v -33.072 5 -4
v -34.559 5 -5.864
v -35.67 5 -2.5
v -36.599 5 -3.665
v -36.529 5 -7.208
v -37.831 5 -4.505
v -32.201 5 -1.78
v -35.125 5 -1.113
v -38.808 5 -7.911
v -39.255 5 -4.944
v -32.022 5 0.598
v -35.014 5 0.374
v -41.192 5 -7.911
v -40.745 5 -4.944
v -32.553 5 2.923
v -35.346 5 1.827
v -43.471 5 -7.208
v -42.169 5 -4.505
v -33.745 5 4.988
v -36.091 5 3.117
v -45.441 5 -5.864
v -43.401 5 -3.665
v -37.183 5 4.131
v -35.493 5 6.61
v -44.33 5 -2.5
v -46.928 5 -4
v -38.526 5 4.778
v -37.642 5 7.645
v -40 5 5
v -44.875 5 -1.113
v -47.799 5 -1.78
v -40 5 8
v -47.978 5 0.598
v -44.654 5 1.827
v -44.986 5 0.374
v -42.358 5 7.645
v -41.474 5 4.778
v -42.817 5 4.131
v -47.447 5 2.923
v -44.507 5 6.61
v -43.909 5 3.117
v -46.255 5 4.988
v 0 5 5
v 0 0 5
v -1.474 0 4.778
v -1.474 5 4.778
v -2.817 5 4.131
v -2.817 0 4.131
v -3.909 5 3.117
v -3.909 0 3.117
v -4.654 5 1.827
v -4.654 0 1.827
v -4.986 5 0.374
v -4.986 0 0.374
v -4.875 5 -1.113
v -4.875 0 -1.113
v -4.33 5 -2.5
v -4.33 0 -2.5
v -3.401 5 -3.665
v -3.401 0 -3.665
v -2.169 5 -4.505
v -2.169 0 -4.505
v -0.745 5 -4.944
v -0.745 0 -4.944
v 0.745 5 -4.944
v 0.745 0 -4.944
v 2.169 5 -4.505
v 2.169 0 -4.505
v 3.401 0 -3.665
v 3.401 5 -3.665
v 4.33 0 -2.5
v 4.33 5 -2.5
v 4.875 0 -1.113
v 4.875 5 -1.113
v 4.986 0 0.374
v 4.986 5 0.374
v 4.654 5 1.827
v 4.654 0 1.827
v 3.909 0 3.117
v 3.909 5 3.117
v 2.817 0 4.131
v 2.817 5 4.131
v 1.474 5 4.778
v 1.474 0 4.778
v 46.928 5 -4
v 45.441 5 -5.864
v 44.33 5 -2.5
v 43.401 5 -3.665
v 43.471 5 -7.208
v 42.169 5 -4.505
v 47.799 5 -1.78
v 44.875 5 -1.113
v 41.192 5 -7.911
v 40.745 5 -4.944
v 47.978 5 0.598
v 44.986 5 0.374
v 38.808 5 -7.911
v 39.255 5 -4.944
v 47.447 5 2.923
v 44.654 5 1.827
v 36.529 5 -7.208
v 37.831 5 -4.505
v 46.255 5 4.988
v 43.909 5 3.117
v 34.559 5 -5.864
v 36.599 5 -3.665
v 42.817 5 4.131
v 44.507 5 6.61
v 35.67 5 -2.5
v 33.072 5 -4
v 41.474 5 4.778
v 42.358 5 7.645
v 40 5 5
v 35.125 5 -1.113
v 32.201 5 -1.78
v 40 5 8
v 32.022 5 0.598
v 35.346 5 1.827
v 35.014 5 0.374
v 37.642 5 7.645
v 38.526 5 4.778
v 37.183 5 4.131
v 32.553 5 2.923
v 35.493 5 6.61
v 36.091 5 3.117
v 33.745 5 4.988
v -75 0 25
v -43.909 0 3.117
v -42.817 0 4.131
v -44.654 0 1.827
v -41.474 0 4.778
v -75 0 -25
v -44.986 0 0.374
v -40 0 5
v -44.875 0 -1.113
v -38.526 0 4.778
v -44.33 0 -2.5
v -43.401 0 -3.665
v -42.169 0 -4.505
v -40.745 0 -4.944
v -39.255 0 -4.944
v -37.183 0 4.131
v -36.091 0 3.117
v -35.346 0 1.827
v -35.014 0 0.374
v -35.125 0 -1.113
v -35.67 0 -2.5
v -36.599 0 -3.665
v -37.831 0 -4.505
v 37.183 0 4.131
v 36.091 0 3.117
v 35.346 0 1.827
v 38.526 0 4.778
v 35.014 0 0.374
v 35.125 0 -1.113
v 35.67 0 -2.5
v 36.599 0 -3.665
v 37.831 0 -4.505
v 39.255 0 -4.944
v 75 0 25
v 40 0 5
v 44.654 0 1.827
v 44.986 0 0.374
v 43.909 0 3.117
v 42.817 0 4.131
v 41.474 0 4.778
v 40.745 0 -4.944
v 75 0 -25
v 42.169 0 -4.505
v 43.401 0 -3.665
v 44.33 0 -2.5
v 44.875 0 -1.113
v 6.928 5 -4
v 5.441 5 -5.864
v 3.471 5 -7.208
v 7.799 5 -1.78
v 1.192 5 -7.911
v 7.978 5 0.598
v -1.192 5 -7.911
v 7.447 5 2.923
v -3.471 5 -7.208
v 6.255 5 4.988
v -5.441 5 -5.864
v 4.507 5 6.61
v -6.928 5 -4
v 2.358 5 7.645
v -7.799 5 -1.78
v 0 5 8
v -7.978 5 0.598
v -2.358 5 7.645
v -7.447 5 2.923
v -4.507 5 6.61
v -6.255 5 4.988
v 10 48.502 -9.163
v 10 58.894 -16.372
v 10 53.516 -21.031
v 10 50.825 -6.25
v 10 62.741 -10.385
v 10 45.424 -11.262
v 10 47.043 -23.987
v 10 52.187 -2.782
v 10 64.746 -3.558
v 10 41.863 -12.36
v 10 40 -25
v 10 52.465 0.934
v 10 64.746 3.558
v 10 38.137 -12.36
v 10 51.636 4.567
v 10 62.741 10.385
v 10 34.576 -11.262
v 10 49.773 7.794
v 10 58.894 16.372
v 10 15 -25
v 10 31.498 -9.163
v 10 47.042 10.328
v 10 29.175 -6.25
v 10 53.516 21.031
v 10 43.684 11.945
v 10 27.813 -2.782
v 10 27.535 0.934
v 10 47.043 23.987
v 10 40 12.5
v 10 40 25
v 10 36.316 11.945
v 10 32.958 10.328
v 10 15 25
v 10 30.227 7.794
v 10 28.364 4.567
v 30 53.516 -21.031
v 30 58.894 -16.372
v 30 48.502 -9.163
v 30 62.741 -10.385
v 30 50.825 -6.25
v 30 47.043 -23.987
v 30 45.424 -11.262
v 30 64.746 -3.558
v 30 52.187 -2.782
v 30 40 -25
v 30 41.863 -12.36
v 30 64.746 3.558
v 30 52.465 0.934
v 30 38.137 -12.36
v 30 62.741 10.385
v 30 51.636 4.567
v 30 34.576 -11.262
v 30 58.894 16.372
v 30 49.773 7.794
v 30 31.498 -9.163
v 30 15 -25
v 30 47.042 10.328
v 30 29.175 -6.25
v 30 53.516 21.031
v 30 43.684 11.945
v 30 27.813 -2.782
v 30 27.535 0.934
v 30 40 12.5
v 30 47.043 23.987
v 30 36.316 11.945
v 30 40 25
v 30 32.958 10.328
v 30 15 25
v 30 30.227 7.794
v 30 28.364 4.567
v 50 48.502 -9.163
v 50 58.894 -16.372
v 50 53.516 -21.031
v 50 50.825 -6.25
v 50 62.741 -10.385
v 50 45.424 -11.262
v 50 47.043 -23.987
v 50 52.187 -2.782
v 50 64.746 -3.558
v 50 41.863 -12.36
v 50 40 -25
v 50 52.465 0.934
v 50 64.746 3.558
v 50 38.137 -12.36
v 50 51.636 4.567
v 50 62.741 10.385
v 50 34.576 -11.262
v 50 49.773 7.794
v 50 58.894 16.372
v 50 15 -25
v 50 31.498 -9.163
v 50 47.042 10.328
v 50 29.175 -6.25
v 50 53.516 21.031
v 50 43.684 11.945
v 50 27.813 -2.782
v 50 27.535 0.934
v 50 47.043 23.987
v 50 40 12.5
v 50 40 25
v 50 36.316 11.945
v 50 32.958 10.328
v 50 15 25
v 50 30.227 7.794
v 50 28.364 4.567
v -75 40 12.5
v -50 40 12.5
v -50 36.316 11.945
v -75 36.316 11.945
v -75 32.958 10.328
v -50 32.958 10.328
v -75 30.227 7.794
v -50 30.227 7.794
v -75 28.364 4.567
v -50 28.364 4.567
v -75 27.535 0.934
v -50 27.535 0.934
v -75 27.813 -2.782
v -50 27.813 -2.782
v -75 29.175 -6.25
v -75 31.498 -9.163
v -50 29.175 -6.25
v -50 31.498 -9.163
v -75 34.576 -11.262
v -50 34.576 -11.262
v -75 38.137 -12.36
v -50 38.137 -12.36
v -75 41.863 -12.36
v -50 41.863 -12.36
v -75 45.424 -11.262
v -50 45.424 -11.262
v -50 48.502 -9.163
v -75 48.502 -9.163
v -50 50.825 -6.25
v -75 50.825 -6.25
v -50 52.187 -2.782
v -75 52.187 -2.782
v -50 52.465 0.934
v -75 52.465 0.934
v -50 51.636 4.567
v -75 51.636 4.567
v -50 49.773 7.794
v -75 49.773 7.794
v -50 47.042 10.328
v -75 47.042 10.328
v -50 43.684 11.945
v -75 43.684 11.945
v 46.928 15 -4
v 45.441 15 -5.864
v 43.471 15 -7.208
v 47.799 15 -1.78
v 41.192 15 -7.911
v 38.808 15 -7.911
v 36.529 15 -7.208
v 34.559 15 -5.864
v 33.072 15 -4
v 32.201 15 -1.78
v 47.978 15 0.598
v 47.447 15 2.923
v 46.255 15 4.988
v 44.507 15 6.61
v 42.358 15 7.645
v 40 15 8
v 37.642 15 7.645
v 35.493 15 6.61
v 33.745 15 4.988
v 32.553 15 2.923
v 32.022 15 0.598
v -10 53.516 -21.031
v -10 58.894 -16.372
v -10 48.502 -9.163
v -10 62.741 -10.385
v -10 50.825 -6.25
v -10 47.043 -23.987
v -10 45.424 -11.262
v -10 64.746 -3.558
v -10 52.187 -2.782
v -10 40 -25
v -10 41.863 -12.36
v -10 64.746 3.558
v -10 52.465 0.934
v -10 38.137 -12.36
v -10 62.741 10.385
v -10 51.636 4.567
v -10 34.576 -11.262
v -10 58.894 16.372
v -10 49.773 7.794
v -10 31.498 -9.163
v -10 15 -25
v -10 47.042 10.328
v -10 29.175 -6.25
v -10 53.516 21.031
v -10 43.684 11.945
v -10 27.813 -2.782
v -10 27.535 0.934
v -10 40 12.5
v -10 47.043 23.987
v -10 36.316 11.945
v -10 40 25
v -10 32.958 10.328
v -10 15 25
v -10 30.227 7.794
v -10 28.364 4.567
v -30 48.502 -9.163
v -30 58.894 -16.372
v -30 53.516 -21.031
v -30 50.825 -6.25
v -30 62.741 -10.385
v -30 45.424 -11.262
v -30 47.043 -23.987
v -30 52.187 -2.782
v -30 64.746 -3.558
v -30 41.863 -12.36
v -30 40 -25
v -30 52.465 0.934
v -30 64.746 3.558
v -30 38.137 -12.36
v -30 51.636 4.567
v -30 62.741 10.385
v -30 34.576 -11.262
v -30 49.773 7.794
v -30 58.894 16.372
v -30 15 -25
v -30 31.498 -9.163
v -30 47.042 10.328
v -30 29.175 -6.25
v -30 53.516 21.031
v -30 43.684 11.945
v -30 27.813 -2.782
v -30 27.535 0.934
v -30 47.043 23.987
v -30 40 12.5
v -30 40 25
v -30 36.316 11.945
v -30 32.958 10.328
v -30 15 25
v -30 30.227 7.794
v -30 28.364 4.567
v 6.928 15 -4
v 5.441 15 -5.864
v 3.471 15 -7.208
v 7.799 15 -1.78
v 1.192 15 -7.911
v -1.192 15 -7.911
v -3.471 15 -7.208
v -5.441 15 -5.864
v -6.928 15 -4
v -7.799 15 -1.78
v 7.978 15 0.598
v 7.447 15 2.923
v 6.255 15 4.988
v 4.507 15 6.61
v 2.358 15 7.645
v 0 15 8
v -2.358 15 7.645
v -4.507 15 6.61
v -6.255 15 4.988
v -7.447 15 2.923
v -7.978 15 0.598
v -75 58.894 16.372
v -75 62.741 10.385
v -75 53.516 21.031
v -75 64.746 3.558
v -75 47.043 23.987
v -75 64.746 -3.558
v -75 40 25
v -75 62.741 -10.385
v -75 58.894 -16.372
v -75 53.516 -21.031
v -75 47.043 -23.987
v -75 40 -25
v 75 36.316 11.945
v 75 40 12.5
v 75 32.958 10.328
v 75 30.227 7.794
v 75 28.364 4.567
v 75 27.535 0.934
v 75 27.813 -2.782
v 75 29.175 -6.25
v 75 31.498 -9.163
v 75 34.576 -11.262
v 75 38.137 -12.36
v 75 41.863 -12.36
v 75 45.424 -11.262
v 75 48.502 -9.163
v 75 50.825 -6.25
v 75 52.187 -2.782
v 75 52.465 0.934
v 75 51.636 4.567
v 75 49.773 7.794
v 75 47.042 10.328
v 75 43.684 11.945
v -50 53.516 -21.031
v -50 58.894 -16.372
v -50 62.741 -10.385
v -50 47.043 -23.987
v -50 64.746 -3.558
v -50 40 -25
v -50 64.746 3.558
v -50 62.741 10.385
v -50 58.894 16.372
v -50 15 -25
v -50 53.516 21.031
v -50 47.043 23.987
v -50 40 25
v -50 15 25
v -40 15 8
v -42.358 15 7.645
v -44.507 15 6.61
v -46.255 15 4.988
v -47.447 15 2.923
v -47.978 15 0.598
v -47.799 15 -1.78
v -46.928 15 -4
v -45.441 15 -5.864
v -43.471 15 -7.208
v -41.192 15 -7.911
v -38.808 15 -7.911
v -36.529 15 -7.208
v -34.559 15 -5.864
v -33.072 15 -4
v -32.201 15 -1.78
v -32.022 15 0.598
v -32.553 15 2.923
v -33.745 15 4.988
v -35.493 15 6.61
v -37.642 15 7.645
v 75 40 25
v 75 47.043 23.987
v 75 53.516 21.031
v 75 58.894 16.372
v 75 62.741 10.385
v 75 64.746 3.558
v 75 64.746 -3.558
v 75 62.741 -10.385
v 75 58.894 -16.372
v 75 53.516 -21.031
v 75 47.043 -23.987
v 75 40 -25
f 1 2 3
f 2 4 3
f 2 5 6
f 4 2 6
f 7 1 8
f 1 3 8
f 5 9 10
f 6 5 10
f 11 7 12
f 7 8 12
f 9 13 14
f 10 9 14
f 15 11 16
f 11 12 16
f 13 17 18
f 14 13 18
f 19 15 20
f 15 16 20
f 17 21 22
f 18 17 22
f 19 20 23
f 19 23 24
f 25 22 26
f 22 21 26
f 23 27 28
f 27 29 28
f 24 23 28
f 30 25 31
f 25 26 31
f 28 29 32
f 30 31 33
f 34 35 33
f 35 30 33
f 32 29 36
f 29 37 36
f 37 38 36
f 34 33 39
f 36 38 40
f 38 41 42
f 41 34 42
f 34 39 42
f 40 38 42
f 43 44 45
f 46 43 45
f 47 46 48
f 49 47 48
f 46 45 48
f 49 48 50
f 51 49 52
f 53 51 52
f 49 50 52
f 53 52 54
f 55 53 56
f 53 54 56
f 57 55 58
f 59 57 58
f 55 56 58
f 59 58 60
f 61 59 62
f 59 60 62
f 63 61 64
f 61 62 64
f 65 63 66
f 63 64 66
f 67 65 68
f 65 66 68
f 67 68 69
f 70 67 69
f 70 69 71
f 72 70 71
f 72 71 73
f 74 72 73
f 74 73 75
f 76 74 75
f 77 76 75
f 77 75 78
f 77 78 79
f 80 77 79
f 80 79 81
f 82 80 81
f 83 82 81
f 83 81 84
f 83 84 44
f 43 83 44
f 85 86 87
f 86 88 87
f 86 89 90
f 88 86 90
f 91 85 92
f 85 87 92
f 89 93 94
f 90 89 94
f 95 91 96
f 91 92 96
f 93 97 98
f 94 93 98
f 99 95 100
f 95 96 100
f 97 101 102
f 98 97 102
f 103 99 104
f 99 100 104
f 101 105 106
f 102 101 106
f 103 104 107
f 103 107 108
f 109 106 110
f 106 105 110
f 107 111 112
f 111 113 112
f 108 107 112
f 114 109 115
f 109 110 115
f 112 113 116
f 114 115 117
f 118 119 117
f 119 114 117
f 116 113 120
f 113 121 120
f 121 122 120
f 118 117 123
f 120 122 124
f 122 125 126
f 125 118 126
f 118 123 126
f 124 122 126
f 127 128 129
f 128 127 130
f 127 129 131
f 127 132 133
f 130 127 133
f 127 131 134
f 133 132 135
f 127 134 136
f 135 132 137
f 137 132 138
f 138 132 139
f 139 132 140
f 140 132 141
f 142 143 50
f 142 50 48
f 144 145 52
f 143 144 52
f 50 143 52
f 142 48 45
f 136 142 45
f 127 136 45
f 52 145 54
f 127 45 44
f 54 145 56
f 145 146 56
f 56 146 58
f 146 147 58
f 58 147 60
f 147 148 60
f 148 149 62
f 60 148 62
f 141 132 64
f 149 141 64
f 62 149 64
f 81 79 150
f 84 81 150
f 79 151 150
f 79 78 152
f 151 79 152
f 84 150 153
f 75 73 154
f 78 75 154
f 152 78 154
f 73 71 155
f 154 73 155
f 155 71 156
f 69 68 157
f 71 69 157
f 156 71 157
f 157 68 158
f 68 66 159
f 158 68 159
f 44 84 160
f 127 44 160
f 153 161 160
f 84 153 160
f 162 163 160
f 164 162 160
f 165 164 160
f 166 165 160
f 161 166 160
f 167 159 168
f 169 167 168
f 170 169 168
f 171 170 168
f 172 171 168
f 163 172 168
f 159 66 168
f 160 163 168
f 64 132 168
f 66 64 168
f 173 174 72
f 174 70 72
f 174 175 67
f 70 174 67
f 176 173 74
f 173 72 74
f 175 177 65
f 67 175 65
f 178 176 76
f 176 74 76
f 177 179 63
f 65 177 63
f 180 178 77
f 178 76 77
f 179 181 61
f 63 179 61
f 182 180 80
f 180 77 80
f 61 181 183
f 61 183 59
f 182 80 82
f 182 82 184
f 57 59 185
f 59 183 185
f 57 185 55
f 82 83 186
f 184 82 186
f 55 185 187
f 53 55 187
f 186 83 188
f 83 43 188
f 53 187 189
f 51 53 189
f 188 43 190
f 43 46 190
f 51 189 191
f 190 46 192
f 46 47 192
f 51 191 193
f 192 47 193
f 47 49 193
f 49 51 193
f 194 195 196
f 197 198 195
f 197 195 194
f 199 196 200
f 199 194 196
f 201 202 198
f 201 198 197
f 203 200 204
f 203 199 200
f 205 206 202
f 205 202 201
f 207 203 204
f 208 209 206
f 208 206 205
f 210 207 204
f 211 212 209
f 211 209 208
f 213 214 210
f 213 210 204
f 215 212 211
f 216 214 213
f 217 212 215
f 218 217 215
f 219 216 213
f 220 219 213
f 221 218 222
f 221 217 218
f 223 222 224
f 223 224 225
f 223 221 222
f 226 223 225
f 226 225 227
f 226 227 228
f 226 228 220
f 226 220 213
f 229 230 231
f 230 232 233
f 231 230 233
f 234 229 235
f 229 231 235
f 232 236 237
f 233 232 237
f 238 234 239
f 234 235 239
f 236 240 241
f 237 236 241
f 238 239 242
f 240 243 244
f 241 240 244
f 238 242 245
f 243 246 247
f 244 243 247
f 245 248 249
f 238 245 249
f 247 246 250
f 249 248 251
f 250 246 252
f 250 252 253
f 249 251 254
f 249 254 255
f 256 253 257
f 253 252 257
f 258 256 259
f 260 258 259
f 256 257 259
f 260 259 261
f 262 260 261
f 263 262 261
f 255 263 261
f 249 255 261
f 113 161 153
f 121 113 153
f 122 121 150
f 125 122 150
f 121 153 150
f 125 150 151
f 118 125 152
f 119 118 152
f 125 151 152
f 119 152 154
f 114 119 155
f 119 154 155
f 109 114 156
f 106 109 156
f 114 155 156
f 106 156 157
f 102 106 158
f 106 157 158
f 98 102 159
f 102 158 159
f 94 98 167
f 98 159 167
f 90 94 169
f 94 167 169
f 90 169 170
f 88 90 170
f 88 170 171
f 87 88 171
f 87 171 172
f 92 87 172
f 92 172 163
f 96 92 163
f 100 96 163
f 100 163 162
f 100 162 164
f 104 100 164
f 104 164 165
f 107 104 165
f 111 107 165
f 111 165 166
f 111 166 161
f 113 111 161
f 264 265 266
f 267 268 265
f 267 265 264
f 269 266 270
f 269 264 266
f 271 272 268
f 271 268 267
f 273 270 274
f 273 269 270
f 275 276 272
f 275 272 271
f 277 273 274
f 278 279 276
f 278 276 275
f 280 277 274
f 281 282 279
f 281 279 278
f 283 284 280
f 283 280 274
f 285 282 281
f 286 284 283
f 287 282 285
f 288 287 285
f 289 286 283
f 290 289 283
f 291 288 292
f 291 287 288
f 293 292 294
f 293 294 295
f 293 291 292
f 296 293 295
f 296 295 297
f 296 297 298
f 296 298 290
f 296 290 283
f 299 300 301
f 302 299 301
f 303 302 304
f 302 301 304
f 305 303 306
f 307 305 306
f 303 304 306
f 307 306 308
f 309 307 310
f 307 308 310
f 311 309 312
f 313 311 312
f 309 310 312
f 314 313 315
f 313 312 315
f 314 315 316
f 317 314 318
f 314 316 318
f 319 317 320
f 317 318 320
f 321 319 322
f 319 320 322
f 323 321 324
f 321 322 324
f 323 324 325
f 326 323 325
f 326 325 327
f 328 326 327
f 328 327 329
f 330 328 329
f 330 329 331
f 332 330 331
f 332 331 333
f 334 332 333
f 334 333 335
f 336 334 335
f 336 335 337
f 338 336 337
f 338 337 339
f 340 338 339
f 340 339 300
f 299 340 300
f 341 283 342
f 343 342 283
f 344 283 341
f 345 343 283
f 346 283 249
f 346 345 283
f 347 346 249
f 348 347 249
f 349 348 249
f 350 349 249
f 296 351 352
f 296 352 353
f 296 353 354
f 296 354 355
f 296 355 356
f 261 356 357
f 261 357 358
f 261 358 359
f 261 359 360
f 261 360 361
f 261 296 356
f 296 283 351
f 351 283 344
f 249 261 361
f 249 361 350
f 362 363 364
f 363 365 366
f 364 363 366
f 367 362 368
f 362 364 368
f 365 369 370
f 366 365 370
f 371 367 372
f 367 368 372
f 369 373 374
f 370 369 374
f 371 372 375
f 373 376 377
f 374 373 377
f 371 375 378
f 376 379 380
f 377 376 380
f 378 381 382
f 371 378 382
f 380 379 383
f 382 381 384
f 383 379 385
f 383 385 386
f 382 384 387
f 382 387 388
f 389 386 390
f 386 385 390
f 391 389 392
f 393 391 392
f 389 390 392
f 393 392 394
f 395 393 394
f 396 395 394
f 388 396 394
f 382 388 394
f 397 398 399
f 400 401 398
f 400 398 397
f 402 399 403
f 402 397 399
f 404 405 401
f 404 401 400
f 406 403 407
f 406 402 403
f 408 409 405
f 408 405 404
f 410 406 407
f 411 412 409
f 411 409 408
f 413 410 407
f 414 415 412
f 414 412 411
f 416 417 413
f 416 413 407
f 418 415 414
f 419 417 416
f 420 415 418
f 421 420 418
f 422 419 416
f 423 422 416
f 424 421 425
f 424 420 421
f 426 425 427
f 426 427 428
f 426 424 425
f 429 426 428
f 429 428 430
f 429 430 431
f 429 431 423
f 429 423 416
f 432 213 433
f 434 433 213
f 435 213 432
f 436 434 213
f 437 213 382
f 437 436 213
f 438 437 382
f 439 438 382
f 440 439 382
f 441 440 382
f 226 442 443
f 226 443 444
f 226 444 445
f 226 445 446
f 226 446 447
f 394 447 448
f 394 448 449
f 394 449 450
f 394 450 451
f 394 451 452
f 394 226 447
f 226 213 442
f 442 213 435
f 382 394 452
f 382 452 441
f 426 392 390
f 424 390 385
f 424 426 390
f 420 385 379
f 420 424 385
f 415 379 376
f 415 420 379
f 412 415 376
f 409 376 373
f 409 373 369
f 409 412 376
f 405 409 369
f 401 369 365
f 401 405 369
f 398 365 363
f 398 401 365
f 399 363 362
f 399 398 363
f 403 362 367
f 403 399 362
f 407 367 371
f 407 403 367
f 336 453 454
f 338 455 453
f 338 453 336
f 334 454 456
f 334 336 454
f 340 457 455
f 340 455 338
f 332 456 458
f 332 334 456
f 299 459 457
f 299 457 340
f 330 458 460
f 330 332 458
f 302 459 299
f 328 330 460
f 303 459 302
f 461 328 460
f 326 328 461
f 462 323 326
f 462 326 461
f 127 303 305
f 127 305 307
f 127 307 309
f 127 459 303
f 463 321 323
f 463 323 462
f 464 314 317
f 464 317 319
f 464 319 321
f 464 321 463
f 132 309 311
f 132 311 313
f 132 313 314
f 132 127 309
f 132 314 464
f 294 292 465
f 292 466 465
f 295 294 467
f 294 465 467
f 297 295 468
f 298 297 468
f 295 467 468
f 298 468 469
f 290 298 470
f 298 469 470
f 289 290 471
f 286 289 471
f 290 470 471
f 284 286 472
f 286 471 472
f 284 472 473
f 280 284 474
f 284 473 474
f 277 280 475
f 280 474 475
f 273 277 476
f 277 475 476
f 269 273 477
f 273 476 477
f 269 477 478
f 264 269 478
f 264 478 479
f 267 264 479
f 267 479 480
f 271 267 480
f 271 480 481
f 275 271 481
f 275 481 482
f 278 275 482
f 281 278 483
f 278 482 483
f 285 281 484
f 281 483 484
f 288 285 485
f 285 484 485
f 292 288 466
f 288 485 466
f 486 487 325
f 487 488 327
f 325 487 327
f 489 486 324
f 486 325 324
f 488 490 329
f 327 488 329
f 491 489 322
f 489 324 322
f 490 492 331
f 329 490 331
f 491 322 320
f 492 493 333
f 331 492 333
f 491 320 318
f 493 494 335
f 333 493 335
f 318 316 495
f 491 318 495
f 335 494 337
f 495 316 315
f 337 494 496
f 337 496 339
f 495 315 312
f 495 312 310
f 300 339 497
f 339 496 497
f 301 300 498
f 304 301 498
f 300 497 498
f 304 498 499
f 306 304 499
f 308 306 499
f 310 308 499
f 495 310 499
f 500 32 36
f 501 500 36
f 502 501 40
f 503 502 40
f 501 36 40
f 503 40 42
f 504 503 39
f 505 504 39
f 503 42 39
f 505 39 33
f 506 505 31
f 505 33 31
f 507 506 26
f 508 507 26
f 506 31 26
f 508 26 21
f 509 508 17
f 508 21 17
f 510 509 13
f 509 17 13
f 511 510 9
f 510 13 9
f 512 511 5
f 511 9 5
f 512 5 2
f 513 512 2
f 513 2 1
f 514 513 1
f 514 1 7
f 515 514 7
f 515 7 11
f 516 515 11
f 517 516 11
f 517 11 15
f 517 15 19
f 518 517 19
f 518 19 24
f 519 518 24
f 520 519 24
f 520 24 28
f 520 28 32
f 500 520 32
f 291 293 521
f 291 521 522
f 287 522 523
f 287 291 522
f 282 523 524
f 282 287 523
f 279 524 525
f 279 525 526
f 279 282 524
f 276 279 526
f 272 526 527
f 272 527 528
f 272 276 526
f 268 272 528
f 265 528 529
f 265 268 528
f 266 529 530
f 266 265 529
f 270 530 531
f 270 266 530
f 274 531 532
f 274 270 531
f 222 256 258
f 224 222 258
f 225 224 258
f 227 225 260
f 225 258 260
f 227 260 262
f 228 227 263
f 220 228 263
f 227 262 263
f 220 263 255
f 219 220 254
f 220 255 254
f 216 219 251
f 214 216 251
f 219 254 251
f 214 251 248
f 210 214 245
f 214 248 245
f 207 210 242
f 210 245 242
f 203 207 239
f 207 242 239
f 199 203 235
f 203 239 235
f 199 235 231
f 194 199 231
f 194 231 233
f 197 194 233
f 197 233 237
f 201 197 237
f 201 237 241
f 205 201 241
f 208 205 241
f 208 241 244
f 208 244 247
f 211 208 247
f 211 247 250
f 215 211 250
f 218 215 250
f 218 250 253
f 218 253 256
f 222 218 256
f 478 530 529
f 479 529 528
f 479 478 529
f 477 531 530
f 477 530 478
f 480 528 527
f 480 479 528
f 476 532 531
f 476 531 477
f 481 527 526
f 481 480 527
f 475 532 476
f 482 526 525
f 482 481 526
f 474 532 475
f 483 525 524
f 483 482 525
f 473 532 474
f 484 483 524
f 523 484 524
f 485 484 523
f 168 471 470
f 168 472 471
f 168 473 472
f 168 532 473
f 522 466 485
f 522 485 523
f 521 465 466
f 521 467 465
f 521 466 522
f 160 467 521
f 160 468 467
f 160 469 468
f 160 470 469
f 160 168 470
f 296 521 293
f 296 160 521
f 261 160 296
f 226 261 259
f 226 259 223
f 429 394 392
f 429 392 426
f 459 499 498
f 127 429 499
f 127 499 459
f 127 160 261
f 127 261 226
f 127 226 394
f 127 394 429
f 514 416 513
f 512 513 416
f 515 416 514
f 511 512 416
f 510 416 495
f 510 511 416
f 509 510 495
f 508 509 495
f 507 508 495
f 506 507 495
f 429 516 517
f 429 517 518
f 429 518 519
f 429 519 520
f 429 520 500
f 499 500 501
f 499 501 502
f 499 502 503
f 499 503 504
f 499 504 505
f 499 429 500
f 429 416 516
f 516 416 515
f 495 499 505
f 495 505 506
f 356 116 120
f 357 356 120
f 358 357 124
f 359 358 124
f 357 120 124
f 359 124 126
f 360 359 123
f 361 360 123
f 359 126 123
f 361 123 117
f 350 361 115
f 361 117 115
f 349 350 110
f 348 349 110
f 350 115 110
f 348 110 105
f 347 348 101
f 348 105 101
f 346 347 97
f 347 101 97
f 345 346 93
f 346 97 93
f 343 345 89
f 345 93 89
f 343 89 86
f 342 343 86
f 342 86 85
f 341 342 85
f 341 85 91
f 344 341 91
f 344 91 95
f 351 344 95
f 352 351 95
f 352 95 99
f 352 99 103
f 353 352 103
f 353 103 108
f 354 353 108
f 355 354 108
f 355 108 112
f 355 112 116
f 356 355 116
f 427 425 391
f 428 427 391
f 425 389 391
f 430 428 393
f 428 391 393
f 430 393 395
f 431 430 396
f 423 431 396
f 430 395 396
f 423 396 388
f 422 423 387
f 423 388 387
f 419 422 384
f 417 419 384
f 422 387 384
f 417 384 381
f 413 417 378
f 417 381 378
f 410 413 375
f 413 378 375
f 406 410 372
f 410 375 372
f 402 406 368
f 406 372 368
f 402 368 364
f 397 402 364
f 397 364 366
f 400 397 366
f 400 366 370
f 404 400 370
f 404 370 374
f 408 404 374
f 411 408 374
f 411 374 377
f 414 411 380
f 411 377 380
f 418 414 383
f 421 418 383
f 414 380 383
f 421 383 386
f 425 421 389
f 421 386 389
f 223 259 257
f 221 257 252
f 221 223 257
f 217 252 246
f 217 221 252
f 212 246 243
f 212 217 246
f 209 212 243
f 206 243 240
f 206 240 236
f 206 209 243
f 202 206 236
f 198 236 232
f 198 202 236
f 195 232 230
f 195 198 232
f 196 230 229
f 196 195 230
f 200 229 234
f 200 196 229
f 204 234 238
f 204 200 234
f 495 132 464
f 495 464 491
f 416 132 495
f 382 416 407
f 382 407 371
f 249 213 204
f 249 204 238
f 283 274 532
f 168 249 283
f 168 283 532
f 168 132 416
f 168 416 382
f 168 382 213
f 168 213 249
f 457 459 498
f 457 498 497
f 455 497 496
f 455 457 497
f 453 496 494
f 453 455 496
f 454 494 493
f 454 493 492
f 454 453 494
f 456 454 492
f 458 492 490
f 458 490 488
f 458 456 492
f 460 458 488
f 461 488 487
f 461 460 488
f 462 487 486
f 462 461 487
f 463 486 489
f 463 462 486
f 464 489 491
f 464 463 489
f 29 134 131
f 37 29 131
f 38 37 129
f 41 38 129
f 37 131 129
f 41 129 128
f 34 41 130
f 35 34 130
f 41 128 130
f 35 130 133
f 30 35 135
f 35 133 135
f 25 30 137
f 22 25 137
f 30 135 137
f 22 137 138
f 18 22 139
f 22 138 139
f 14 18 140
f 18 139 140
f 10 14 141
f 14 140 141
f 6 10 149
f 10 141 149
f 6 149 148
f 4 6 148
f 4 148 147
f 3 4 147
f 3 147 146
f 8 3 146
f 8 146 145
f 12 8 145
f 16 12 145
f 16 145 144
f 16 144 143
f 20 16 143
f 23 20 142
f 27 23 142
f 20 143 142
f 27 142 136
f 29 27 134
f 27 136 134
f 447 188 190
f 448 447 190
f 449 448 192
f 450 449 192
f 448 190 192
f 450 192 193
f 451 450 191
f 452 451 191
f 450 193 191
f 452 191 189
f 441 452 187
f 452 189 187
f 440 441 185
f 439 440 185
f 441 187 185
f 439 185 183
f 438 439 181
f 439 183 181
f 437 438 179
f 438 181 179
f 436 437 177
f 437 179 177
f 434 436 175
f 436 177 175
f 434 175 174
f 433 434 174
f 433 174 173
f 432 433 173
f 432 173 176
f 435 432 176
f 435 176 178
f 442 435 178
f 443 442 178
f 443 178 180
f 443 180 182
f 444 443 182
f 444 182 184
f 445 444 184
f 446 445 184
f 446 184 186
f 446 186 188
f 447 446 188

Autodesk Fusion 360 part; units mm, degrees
sketch "Sketch1" plane through (0, 0, 0) normal (0, 1, 0) x (1, 0, 0)
  line L0 (75, -25) -> (-75, -25)
  line L1 (-75, -25) -> (-75, 25)
  line L2 (-75, 25) -> (75, 25)
  line L3 (75, 25) -> (75, -25)
  line L4 (75, -25) -> (-75, 25) construction
  line L5 (-75, -25) -> (75, 25) construction
  dimension "d1" = 150
  dimension "d2" = 50
extrude "Extrude1" add sketch "Sketch1" along normal blind 65
sketch "Sketch2" plane through (0, 0, 25) normal (0, 0, 1) x (1, 0, 0)
  line L0 (-75, 0) -> (75, 0)
  line L1 (75, 0) -> (75, 65)
  line L2 (75, 65) -> (-75, 65)
  line L3 (-75, 65) -> (-75, 0)
  line L4 (-75, 0) -> (75, 0)
  line L5 (75, 0) -> (75, 15)
  line L6 (75, 15) -> (-75, 15)
  line L7 (-75, 15) -> (-75, 0)
  line L8 (-75, 65) -> (-50, 65)
  line L9 (-50, 65) -> (-50, 15)
  line L10 (-50, 15) -> (-75, 15)
  line L11 (-75, 15) -> (-75, 65)
  line L12 (75, 65) -> (50, 65)
  line L13 (50, 65) -> (50, 15)
  line L14 (50, 15) -> (75, 15)
  line L15 (75, 15) -> (75, 65)
  line L16 (-50, 65) -> (-30, 65)
  line L17 (-30, 65) -> (-30, 15)
  line L18 (-30, 15) -> (-50, 15)
  line L19 (-50, 15) -> (-50, 65)
  line L20 (-30, 65) -> (-10, 65)
  line L21 (-10, 65) -> (-10, 15)
  line L22 (-10, 15) -> (-30, 15)
  line L23 (-30, 15) -> (-30, 65)
  line L24 (-10, 65) -> (10, 65)
  line L25 (10, 65) -> (10, 15)
  line L26 (10, 15) -> (-10, 15)
  line L27 (-10, 15) -> (-10, 65)
  line L28 (10, 65) -> (30, 65)
  line L29 (30, 65) -> (30, 15)
  line L30 (30, 15) -> (10, 15)
  line L31 (10, 15) -> (10, 65)
  line L32 (30, 65) -> (50, 65)
  line L33 (50, 65) -> (50, 15)
  line L34 (50, 15) -> (30, 15)
  line L35 (30, 15) -> (30, 65)
  dimension "d5" = 150
  dimension "d6" = 15
  dimension "d7" = 20
  dimension "d8" = 20
  dimension "d9" = 20
  dimension "d10" = 20
  dimension "d11" = 20
  dimension "d12" = 25
extrude "Extrude2" cut sketch "Sketch2" against normal blind 50 contours L2 L6 L9 L16 L17 L18 L19 L23 | L2 L6 L13 L29 L32 L33 L34 L35 | L2 L6 L21 L24 L25 L26 L27 L31
sketch "Sketch3" plane through (-75, 0, 0) normal (-1, 0, 0) x (0, 0, 1)
  line L0 (-25, 0) -> (25, 0)
  line L1 (25, 0) -> (25, 65)
  line L2 (25, 65) -> (-25, 65)
  line L3 (-25, 65) -> (-25, 0)
  circle A0 centre (0, 40) radius 25
  dimension "d15" = 40
extrude "Extrude3" cut sketch "Sketch3" against normal blind 150 contours L2 L3 A0 | L1 L2 A0
sketch "Sketch4" plane through (0, 15, 0) normal (0, 1, 0) x (-1, 0, 0)
  line L0 (50, 25) -> (30, 25)
  line L1 (30, 25) -> (30, -25)
  line L2 (30, -25) -> (50, -25)
  line L3 (50, -25) -> (50, 25)
  circle A0 centre (40, 0) radius 5
  circle A1 centre (0, 0) radius 5
  circle A2 centre (-40, 0) radius 5
hole "Hole1" at (-40, 15, 0) at (0, 15, 0) at (40, 15, 0) direction (0, -1, 0) diameter 10 depth 30 tip angle 118 counterbore diameter 16 counterbore depth 10
sketch "Sketch5" plane through (-75, 0, 0) normal (-1, 0, 0) x (0, 0, 1)
  arc A0 (25, 40) -> (-25, 40) centre (0, 40) ccw
  line L0 (-25, 40) -> (-25, 0)
  line L1 (-25, 0) -> (25, 0)
  line L2 (25, 0) -> (25, 40)
  circle A1 centre (0, 40) radius 25
  dimension "d23" = 50
hole "Hole2" at (-75, 40, 0) direction (1, 0, 0) diameter 25 depth 150 tip angle 180
